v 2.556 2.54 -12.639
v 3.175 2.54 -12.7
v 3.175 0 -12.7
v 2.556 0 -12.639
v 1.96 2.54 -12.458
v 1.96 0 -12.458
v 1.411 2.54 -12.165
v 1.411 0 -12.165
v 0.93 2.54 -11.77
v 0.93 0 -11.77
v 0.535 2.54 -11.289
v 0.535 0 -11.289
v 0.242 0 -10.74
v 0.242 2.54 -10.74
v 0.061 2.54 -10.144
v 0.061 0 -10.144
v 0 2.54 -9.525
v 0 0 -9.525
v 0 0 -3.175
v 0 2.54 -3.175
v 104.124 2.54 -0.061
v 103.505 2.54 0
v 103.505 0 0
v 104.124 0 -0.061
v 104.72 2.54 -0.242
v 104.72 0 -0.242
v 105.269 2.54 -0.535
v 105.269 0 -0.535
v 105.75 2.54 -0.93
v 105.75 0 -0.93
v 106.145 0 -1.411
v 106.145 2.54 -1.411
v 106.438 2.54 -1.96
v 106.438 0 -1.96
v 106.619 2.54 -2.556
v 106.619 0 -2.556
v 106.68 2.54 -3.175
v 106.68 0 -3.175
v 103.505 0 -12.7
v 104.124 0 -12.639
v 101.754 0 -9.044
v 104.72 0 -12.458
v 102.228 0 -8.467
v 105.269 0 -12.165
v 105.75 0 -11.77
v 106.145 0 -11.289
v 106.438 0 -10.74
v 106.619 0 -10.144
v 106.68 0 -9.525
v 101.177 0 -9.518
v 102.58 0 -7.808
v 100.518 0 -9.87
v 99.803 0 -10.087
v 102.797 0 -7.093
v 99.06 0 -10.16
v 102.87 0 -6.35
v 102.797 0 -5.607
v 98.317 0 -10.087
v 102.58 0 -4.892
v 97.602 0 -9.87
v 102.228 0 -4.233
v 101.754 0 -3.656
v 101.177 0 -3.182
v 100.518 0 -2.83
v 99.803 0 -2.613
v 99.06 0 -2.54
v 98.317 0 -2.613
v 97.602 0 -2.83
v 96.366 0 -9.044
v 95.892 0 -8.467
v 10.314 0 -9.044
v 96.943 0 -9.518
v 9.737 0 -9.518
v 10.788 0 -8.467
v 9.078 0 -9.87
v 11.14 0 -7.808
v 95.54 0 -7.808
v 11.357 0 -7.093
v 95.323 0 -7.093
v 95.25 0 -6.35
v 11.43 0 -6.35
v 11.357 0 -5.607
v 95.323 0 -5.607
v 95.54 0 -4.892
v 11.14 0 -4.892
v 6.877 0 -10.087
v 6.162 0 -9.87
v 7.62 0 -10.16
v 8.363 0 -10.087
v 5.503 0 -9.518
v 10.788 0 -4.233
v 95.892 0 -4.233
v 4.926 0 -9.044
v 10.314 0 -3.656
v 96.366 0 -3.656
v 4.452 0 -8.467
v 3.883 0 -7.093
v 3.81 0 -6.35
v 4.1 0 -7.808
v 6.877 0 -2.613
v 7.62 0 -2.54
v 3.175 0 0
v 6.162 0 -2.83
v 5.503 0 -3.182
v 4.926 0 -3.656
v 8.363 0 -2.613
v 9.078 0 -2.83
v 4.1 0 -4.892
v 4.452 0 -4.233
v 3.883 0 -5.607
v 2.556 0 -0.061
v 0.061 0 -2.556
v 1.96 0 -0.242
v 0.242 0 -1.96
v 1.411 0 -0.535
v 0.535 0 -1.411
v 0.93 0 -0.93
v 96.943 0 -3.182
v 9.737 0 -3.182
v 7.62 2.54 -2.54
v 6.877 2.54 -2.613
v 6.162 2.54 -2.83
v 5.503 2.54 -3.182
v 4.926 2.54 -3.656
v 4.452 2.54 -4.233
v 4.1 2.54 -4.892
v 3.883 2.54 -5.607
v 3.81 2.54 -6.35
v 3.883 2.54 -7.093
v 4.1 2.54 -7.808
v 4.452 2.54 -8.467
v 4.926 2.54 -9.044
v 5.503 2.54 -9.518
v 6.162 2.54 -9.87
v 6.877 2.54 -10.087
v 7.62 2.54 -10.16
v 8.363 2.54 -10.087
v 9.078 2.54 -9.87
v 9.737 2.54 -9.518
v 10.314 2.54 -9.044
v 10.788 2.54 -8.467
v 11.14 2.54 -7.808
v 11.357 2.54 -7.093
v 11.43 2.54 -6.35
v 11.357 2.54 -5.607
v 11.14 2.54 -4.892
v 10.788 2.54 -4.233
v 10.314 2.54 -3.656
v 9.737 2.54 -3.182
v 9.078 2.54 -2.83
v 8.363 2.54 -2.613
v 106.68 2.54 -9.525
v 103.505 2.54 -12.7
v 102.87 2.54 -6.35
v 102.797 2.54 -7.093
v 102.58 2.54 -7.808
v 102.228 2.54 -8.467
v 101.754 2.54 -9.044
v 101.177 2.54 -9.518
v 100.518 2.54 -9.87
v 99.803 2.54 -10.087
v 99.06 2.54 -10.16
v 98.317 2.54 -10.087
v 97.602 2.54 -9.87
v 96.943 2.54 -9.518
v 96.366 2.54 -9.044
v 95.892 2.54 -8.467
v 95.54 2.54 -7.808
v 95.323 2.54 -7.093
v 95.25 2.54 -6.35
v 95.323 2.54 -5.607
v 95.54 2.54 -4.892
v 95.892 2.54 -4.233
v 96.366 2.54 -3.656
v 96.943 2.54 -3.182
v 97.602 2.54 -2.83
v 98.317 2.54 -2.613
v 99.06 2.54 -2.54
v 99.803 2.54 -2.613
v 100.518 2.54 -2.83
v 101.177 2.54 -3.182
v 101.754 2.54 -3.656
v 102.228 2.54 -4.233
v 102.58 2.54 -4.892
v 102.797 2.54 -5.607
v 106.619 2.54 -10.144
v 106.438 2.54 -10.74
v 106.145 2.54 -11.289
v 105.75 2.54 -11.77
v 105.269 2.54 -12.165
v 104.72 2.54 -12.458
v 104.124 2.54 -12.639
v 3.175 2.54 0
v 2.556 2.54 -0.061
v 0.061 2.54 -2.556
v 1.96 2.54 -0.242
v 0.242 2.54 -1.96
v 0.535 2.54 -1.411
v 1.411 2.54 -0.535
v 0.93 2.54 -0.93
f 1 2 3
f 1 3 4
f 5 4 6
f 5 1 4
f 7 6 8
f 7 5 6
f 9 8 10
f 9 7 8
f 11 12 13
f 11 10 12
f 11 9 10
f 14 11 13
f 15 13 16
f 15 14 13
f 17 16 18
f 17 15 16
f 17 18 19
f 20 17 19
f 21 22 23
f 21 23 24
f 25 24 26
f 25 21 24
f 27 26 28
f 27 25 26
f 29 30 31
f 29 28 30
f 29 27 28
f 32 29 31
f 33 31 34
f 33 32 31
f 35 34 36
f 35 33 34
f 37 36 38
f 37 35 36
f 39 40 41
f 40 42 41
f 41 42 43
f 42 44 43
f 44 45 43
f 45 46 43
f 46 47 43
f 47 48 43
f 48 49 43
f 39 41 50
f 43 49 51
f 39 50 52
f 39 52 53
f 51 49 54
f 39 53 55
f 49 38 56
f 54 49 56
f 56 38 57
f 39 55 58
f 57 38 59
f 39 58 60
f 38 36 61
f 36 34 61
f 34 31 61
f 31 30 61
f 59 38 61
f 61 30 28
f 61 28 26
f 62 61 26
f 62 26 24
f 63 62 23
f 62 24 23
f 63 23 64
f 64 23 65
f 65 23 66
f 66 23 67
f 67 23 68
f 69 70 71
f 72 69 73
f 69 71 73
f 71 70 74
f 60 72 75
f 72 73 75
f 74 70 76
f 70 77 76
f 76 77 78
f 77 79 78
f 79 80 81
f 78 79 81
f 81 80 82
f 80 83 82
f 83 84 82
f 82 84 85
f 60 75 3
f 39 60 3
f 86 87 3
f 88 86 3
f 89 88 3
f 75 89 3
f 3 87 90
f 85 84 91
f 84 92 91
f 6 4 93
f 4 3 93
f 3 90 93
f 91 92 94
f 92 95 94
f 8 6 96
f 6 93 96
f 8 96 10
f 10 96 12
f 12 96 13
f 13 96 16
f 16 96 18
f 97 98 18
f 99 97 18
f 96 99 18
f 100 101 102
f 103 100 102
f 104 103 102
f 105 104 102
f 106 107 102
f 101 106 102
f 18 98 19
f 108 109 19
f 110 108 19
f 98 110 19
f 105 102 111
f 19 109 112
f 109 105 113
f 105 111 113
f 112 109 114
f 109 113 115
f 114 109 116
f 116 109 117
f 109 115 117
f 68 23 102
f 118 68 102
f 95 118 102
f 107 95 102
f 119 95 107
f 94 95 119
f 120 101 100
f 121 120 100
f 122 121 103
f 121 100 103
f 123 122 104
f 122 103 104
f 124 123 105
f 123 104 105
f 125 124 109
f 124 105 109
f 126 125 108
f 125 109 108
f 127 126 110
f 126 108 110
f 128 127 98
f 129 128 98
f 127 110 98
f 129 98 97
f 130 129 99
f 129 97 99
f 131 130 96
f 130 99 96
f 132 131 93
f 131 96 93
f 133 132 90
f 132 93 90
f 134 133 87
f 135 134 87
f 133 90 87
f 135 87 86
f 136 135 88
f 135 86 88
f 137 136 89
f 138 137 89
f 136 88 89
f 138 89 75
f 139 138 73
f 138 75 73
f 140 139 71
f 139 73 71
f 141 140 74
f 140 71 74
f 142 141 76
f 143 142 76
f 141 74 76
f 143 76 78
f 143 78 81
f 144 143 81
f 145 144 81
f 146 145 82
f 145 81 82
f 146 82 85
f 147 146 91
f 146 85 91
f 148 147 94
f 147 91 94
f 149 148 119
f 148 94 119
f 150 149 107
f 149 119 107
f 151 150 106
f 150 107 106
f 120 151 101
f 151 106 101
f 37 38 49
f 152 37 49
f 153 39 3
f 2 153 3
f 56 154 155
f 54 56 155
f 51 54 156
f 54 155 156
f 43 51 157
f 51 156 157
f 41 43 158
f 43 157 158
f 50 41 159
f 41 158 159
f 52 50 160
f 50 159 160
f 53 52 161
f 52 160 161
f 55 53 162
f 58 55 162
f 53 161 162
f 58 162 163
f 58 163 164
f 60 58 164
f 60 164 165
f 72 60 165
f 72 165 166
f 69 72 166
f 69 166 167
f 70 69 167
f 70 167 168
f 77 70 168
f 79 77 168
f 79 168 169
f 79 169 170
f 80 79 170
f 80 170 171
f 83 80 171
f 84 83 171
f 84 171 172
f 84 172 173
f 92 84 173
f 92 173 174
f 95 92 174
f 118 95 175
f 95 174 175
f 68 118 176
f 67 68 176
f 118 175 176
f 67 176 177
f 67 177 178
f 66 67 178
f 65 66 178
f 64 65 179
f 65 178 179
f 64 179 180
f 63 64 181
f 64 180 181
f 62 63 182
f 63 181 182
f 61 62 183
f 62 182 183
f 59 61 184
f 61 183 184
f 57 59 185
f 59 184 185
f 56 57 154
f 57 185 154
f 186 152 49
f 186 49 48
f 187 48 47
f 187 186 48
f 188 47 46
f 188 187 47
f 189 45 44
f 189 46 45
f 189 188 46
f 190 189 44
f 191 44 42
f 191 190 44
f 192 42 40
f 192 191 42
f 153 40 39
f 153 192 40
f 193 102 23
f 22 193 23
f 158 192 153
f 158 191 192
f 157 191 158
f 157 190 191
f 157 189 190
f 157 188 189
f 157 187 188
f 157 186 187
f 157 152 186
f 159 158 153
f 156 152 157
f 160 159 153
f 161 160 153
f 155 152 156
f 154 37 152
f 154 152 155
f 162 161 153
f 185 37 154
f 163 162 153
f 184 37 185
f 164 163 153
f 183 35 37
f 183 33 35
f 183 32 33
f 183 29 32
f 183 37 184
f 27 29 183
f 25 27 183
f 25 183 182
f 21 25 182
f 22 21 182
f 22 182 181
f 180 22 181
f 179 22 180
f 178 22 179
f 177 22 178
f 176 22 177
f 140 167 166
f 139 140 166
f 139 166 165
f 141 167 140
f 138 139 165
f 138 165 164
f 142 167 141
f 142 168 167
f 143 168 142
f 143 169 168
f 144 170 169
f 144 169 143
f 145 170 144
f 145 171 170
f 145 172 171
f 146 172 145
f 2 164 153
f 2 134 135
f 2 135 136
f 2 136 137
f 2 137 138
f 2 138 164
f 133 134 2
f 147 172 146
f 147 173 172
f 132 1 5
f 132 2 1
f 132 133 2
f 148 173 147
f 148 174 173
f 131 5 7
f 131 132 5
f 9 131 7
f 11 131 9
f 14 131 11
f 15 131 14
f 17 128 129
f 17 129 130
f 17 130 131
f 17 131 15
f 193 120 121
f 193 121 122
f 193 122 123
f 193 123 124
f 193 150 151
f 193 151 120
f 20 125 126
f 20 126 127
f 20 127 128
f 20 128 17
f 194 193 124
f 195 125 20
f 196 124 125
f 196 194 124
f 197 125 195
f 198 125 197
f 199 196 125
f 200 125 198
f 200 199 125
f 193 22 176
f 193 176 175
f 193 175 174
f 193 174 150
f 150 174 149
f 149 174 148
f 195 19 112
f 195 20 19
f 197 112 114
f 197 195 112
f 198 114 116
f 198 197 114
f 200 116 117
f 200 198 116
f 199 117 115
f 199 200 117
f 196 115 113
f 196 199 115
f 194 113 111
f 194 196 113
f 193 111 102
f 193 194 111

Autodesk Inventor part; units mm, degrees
ref_plane "YZ Plane" through (0, 0, 0) normal (1, 0, 0) x (0, 1, 0)
ref_plane "XZ Plane" through (0, 0, 0) normal (0, 1, 0) x (-1, 0, 0)
ref_plane "XY Plane" through (0, 0, 0) normal (0, 0, 1) x (1, 0, 0)
sketch "Sketch1" plane through (0, 0, 0) normal (0, 1, 0) x (-1, 0, 0)
  line L0 (0, 0) -> (-106.68, 0)
  line L1 (-106.68, 0) -> (-106.68, -12.7)
  line L2 (-106.68, -12.7) -> (0, -12.7)
  line L3 (0, -12.7) -> (0, 0)
  dimension "d0" = 106.68
  dimension "d1" = 12.7
extrude "Extrusion1" add sketch "Sketch1" along normal blind 2.54
fillet "Fillet1" radius 3.175 4 edges at (106.68, 1.27, 0) (106.68, 1.27, -12.7) (0, 1.27, 0) (0, 1.27, -12.7)
sketch "Sketch2" plane through (0, 2.54, 0) normal (0, 1, 0) x (1, 0, 0)
  line L0 (106.68, 3.175) -> (106.68, 9.525) projected
  line L1 (106.68, 6.35) -> (99.06, 6.35)
  line L2 (0, 6.35) -> (7.62, 6.35)
  circle A0 centre (99.06, 6.35) radius 3.81
  circle A1 centre (7.62, 6.35) radius 3.81
  point P0 (0, 0)
  dimension "d5" = 7.62
  dimension "d6" = 7.62
  dimension "d7" = 7.62
  dimension "d8" = 7.62
extrude "Extrusion2" cut sketch "Sketch2" against normal blind 2.54 contours A0
sketch "Sketch3" plane through (0, 2.54, 0) normal (0, 1, 0) x (1, 0, 0)
  line L0 (0, 9.525) -> (0, 3.175) projected
  line L1 (0, 6.35) -> (7.62, 6.35)
  circle A0 centre (7.62, 6.35) radius 3.81
  point P0 (0, 0)
  dimension "d11" = 7.62
  dimension "d12" = 7.62
hole "Hole1" at (7.62, 2.54, -6.35) direction (0, -1, 0) diameter 7.62 end through all
properties part number "Side Rod V1"
